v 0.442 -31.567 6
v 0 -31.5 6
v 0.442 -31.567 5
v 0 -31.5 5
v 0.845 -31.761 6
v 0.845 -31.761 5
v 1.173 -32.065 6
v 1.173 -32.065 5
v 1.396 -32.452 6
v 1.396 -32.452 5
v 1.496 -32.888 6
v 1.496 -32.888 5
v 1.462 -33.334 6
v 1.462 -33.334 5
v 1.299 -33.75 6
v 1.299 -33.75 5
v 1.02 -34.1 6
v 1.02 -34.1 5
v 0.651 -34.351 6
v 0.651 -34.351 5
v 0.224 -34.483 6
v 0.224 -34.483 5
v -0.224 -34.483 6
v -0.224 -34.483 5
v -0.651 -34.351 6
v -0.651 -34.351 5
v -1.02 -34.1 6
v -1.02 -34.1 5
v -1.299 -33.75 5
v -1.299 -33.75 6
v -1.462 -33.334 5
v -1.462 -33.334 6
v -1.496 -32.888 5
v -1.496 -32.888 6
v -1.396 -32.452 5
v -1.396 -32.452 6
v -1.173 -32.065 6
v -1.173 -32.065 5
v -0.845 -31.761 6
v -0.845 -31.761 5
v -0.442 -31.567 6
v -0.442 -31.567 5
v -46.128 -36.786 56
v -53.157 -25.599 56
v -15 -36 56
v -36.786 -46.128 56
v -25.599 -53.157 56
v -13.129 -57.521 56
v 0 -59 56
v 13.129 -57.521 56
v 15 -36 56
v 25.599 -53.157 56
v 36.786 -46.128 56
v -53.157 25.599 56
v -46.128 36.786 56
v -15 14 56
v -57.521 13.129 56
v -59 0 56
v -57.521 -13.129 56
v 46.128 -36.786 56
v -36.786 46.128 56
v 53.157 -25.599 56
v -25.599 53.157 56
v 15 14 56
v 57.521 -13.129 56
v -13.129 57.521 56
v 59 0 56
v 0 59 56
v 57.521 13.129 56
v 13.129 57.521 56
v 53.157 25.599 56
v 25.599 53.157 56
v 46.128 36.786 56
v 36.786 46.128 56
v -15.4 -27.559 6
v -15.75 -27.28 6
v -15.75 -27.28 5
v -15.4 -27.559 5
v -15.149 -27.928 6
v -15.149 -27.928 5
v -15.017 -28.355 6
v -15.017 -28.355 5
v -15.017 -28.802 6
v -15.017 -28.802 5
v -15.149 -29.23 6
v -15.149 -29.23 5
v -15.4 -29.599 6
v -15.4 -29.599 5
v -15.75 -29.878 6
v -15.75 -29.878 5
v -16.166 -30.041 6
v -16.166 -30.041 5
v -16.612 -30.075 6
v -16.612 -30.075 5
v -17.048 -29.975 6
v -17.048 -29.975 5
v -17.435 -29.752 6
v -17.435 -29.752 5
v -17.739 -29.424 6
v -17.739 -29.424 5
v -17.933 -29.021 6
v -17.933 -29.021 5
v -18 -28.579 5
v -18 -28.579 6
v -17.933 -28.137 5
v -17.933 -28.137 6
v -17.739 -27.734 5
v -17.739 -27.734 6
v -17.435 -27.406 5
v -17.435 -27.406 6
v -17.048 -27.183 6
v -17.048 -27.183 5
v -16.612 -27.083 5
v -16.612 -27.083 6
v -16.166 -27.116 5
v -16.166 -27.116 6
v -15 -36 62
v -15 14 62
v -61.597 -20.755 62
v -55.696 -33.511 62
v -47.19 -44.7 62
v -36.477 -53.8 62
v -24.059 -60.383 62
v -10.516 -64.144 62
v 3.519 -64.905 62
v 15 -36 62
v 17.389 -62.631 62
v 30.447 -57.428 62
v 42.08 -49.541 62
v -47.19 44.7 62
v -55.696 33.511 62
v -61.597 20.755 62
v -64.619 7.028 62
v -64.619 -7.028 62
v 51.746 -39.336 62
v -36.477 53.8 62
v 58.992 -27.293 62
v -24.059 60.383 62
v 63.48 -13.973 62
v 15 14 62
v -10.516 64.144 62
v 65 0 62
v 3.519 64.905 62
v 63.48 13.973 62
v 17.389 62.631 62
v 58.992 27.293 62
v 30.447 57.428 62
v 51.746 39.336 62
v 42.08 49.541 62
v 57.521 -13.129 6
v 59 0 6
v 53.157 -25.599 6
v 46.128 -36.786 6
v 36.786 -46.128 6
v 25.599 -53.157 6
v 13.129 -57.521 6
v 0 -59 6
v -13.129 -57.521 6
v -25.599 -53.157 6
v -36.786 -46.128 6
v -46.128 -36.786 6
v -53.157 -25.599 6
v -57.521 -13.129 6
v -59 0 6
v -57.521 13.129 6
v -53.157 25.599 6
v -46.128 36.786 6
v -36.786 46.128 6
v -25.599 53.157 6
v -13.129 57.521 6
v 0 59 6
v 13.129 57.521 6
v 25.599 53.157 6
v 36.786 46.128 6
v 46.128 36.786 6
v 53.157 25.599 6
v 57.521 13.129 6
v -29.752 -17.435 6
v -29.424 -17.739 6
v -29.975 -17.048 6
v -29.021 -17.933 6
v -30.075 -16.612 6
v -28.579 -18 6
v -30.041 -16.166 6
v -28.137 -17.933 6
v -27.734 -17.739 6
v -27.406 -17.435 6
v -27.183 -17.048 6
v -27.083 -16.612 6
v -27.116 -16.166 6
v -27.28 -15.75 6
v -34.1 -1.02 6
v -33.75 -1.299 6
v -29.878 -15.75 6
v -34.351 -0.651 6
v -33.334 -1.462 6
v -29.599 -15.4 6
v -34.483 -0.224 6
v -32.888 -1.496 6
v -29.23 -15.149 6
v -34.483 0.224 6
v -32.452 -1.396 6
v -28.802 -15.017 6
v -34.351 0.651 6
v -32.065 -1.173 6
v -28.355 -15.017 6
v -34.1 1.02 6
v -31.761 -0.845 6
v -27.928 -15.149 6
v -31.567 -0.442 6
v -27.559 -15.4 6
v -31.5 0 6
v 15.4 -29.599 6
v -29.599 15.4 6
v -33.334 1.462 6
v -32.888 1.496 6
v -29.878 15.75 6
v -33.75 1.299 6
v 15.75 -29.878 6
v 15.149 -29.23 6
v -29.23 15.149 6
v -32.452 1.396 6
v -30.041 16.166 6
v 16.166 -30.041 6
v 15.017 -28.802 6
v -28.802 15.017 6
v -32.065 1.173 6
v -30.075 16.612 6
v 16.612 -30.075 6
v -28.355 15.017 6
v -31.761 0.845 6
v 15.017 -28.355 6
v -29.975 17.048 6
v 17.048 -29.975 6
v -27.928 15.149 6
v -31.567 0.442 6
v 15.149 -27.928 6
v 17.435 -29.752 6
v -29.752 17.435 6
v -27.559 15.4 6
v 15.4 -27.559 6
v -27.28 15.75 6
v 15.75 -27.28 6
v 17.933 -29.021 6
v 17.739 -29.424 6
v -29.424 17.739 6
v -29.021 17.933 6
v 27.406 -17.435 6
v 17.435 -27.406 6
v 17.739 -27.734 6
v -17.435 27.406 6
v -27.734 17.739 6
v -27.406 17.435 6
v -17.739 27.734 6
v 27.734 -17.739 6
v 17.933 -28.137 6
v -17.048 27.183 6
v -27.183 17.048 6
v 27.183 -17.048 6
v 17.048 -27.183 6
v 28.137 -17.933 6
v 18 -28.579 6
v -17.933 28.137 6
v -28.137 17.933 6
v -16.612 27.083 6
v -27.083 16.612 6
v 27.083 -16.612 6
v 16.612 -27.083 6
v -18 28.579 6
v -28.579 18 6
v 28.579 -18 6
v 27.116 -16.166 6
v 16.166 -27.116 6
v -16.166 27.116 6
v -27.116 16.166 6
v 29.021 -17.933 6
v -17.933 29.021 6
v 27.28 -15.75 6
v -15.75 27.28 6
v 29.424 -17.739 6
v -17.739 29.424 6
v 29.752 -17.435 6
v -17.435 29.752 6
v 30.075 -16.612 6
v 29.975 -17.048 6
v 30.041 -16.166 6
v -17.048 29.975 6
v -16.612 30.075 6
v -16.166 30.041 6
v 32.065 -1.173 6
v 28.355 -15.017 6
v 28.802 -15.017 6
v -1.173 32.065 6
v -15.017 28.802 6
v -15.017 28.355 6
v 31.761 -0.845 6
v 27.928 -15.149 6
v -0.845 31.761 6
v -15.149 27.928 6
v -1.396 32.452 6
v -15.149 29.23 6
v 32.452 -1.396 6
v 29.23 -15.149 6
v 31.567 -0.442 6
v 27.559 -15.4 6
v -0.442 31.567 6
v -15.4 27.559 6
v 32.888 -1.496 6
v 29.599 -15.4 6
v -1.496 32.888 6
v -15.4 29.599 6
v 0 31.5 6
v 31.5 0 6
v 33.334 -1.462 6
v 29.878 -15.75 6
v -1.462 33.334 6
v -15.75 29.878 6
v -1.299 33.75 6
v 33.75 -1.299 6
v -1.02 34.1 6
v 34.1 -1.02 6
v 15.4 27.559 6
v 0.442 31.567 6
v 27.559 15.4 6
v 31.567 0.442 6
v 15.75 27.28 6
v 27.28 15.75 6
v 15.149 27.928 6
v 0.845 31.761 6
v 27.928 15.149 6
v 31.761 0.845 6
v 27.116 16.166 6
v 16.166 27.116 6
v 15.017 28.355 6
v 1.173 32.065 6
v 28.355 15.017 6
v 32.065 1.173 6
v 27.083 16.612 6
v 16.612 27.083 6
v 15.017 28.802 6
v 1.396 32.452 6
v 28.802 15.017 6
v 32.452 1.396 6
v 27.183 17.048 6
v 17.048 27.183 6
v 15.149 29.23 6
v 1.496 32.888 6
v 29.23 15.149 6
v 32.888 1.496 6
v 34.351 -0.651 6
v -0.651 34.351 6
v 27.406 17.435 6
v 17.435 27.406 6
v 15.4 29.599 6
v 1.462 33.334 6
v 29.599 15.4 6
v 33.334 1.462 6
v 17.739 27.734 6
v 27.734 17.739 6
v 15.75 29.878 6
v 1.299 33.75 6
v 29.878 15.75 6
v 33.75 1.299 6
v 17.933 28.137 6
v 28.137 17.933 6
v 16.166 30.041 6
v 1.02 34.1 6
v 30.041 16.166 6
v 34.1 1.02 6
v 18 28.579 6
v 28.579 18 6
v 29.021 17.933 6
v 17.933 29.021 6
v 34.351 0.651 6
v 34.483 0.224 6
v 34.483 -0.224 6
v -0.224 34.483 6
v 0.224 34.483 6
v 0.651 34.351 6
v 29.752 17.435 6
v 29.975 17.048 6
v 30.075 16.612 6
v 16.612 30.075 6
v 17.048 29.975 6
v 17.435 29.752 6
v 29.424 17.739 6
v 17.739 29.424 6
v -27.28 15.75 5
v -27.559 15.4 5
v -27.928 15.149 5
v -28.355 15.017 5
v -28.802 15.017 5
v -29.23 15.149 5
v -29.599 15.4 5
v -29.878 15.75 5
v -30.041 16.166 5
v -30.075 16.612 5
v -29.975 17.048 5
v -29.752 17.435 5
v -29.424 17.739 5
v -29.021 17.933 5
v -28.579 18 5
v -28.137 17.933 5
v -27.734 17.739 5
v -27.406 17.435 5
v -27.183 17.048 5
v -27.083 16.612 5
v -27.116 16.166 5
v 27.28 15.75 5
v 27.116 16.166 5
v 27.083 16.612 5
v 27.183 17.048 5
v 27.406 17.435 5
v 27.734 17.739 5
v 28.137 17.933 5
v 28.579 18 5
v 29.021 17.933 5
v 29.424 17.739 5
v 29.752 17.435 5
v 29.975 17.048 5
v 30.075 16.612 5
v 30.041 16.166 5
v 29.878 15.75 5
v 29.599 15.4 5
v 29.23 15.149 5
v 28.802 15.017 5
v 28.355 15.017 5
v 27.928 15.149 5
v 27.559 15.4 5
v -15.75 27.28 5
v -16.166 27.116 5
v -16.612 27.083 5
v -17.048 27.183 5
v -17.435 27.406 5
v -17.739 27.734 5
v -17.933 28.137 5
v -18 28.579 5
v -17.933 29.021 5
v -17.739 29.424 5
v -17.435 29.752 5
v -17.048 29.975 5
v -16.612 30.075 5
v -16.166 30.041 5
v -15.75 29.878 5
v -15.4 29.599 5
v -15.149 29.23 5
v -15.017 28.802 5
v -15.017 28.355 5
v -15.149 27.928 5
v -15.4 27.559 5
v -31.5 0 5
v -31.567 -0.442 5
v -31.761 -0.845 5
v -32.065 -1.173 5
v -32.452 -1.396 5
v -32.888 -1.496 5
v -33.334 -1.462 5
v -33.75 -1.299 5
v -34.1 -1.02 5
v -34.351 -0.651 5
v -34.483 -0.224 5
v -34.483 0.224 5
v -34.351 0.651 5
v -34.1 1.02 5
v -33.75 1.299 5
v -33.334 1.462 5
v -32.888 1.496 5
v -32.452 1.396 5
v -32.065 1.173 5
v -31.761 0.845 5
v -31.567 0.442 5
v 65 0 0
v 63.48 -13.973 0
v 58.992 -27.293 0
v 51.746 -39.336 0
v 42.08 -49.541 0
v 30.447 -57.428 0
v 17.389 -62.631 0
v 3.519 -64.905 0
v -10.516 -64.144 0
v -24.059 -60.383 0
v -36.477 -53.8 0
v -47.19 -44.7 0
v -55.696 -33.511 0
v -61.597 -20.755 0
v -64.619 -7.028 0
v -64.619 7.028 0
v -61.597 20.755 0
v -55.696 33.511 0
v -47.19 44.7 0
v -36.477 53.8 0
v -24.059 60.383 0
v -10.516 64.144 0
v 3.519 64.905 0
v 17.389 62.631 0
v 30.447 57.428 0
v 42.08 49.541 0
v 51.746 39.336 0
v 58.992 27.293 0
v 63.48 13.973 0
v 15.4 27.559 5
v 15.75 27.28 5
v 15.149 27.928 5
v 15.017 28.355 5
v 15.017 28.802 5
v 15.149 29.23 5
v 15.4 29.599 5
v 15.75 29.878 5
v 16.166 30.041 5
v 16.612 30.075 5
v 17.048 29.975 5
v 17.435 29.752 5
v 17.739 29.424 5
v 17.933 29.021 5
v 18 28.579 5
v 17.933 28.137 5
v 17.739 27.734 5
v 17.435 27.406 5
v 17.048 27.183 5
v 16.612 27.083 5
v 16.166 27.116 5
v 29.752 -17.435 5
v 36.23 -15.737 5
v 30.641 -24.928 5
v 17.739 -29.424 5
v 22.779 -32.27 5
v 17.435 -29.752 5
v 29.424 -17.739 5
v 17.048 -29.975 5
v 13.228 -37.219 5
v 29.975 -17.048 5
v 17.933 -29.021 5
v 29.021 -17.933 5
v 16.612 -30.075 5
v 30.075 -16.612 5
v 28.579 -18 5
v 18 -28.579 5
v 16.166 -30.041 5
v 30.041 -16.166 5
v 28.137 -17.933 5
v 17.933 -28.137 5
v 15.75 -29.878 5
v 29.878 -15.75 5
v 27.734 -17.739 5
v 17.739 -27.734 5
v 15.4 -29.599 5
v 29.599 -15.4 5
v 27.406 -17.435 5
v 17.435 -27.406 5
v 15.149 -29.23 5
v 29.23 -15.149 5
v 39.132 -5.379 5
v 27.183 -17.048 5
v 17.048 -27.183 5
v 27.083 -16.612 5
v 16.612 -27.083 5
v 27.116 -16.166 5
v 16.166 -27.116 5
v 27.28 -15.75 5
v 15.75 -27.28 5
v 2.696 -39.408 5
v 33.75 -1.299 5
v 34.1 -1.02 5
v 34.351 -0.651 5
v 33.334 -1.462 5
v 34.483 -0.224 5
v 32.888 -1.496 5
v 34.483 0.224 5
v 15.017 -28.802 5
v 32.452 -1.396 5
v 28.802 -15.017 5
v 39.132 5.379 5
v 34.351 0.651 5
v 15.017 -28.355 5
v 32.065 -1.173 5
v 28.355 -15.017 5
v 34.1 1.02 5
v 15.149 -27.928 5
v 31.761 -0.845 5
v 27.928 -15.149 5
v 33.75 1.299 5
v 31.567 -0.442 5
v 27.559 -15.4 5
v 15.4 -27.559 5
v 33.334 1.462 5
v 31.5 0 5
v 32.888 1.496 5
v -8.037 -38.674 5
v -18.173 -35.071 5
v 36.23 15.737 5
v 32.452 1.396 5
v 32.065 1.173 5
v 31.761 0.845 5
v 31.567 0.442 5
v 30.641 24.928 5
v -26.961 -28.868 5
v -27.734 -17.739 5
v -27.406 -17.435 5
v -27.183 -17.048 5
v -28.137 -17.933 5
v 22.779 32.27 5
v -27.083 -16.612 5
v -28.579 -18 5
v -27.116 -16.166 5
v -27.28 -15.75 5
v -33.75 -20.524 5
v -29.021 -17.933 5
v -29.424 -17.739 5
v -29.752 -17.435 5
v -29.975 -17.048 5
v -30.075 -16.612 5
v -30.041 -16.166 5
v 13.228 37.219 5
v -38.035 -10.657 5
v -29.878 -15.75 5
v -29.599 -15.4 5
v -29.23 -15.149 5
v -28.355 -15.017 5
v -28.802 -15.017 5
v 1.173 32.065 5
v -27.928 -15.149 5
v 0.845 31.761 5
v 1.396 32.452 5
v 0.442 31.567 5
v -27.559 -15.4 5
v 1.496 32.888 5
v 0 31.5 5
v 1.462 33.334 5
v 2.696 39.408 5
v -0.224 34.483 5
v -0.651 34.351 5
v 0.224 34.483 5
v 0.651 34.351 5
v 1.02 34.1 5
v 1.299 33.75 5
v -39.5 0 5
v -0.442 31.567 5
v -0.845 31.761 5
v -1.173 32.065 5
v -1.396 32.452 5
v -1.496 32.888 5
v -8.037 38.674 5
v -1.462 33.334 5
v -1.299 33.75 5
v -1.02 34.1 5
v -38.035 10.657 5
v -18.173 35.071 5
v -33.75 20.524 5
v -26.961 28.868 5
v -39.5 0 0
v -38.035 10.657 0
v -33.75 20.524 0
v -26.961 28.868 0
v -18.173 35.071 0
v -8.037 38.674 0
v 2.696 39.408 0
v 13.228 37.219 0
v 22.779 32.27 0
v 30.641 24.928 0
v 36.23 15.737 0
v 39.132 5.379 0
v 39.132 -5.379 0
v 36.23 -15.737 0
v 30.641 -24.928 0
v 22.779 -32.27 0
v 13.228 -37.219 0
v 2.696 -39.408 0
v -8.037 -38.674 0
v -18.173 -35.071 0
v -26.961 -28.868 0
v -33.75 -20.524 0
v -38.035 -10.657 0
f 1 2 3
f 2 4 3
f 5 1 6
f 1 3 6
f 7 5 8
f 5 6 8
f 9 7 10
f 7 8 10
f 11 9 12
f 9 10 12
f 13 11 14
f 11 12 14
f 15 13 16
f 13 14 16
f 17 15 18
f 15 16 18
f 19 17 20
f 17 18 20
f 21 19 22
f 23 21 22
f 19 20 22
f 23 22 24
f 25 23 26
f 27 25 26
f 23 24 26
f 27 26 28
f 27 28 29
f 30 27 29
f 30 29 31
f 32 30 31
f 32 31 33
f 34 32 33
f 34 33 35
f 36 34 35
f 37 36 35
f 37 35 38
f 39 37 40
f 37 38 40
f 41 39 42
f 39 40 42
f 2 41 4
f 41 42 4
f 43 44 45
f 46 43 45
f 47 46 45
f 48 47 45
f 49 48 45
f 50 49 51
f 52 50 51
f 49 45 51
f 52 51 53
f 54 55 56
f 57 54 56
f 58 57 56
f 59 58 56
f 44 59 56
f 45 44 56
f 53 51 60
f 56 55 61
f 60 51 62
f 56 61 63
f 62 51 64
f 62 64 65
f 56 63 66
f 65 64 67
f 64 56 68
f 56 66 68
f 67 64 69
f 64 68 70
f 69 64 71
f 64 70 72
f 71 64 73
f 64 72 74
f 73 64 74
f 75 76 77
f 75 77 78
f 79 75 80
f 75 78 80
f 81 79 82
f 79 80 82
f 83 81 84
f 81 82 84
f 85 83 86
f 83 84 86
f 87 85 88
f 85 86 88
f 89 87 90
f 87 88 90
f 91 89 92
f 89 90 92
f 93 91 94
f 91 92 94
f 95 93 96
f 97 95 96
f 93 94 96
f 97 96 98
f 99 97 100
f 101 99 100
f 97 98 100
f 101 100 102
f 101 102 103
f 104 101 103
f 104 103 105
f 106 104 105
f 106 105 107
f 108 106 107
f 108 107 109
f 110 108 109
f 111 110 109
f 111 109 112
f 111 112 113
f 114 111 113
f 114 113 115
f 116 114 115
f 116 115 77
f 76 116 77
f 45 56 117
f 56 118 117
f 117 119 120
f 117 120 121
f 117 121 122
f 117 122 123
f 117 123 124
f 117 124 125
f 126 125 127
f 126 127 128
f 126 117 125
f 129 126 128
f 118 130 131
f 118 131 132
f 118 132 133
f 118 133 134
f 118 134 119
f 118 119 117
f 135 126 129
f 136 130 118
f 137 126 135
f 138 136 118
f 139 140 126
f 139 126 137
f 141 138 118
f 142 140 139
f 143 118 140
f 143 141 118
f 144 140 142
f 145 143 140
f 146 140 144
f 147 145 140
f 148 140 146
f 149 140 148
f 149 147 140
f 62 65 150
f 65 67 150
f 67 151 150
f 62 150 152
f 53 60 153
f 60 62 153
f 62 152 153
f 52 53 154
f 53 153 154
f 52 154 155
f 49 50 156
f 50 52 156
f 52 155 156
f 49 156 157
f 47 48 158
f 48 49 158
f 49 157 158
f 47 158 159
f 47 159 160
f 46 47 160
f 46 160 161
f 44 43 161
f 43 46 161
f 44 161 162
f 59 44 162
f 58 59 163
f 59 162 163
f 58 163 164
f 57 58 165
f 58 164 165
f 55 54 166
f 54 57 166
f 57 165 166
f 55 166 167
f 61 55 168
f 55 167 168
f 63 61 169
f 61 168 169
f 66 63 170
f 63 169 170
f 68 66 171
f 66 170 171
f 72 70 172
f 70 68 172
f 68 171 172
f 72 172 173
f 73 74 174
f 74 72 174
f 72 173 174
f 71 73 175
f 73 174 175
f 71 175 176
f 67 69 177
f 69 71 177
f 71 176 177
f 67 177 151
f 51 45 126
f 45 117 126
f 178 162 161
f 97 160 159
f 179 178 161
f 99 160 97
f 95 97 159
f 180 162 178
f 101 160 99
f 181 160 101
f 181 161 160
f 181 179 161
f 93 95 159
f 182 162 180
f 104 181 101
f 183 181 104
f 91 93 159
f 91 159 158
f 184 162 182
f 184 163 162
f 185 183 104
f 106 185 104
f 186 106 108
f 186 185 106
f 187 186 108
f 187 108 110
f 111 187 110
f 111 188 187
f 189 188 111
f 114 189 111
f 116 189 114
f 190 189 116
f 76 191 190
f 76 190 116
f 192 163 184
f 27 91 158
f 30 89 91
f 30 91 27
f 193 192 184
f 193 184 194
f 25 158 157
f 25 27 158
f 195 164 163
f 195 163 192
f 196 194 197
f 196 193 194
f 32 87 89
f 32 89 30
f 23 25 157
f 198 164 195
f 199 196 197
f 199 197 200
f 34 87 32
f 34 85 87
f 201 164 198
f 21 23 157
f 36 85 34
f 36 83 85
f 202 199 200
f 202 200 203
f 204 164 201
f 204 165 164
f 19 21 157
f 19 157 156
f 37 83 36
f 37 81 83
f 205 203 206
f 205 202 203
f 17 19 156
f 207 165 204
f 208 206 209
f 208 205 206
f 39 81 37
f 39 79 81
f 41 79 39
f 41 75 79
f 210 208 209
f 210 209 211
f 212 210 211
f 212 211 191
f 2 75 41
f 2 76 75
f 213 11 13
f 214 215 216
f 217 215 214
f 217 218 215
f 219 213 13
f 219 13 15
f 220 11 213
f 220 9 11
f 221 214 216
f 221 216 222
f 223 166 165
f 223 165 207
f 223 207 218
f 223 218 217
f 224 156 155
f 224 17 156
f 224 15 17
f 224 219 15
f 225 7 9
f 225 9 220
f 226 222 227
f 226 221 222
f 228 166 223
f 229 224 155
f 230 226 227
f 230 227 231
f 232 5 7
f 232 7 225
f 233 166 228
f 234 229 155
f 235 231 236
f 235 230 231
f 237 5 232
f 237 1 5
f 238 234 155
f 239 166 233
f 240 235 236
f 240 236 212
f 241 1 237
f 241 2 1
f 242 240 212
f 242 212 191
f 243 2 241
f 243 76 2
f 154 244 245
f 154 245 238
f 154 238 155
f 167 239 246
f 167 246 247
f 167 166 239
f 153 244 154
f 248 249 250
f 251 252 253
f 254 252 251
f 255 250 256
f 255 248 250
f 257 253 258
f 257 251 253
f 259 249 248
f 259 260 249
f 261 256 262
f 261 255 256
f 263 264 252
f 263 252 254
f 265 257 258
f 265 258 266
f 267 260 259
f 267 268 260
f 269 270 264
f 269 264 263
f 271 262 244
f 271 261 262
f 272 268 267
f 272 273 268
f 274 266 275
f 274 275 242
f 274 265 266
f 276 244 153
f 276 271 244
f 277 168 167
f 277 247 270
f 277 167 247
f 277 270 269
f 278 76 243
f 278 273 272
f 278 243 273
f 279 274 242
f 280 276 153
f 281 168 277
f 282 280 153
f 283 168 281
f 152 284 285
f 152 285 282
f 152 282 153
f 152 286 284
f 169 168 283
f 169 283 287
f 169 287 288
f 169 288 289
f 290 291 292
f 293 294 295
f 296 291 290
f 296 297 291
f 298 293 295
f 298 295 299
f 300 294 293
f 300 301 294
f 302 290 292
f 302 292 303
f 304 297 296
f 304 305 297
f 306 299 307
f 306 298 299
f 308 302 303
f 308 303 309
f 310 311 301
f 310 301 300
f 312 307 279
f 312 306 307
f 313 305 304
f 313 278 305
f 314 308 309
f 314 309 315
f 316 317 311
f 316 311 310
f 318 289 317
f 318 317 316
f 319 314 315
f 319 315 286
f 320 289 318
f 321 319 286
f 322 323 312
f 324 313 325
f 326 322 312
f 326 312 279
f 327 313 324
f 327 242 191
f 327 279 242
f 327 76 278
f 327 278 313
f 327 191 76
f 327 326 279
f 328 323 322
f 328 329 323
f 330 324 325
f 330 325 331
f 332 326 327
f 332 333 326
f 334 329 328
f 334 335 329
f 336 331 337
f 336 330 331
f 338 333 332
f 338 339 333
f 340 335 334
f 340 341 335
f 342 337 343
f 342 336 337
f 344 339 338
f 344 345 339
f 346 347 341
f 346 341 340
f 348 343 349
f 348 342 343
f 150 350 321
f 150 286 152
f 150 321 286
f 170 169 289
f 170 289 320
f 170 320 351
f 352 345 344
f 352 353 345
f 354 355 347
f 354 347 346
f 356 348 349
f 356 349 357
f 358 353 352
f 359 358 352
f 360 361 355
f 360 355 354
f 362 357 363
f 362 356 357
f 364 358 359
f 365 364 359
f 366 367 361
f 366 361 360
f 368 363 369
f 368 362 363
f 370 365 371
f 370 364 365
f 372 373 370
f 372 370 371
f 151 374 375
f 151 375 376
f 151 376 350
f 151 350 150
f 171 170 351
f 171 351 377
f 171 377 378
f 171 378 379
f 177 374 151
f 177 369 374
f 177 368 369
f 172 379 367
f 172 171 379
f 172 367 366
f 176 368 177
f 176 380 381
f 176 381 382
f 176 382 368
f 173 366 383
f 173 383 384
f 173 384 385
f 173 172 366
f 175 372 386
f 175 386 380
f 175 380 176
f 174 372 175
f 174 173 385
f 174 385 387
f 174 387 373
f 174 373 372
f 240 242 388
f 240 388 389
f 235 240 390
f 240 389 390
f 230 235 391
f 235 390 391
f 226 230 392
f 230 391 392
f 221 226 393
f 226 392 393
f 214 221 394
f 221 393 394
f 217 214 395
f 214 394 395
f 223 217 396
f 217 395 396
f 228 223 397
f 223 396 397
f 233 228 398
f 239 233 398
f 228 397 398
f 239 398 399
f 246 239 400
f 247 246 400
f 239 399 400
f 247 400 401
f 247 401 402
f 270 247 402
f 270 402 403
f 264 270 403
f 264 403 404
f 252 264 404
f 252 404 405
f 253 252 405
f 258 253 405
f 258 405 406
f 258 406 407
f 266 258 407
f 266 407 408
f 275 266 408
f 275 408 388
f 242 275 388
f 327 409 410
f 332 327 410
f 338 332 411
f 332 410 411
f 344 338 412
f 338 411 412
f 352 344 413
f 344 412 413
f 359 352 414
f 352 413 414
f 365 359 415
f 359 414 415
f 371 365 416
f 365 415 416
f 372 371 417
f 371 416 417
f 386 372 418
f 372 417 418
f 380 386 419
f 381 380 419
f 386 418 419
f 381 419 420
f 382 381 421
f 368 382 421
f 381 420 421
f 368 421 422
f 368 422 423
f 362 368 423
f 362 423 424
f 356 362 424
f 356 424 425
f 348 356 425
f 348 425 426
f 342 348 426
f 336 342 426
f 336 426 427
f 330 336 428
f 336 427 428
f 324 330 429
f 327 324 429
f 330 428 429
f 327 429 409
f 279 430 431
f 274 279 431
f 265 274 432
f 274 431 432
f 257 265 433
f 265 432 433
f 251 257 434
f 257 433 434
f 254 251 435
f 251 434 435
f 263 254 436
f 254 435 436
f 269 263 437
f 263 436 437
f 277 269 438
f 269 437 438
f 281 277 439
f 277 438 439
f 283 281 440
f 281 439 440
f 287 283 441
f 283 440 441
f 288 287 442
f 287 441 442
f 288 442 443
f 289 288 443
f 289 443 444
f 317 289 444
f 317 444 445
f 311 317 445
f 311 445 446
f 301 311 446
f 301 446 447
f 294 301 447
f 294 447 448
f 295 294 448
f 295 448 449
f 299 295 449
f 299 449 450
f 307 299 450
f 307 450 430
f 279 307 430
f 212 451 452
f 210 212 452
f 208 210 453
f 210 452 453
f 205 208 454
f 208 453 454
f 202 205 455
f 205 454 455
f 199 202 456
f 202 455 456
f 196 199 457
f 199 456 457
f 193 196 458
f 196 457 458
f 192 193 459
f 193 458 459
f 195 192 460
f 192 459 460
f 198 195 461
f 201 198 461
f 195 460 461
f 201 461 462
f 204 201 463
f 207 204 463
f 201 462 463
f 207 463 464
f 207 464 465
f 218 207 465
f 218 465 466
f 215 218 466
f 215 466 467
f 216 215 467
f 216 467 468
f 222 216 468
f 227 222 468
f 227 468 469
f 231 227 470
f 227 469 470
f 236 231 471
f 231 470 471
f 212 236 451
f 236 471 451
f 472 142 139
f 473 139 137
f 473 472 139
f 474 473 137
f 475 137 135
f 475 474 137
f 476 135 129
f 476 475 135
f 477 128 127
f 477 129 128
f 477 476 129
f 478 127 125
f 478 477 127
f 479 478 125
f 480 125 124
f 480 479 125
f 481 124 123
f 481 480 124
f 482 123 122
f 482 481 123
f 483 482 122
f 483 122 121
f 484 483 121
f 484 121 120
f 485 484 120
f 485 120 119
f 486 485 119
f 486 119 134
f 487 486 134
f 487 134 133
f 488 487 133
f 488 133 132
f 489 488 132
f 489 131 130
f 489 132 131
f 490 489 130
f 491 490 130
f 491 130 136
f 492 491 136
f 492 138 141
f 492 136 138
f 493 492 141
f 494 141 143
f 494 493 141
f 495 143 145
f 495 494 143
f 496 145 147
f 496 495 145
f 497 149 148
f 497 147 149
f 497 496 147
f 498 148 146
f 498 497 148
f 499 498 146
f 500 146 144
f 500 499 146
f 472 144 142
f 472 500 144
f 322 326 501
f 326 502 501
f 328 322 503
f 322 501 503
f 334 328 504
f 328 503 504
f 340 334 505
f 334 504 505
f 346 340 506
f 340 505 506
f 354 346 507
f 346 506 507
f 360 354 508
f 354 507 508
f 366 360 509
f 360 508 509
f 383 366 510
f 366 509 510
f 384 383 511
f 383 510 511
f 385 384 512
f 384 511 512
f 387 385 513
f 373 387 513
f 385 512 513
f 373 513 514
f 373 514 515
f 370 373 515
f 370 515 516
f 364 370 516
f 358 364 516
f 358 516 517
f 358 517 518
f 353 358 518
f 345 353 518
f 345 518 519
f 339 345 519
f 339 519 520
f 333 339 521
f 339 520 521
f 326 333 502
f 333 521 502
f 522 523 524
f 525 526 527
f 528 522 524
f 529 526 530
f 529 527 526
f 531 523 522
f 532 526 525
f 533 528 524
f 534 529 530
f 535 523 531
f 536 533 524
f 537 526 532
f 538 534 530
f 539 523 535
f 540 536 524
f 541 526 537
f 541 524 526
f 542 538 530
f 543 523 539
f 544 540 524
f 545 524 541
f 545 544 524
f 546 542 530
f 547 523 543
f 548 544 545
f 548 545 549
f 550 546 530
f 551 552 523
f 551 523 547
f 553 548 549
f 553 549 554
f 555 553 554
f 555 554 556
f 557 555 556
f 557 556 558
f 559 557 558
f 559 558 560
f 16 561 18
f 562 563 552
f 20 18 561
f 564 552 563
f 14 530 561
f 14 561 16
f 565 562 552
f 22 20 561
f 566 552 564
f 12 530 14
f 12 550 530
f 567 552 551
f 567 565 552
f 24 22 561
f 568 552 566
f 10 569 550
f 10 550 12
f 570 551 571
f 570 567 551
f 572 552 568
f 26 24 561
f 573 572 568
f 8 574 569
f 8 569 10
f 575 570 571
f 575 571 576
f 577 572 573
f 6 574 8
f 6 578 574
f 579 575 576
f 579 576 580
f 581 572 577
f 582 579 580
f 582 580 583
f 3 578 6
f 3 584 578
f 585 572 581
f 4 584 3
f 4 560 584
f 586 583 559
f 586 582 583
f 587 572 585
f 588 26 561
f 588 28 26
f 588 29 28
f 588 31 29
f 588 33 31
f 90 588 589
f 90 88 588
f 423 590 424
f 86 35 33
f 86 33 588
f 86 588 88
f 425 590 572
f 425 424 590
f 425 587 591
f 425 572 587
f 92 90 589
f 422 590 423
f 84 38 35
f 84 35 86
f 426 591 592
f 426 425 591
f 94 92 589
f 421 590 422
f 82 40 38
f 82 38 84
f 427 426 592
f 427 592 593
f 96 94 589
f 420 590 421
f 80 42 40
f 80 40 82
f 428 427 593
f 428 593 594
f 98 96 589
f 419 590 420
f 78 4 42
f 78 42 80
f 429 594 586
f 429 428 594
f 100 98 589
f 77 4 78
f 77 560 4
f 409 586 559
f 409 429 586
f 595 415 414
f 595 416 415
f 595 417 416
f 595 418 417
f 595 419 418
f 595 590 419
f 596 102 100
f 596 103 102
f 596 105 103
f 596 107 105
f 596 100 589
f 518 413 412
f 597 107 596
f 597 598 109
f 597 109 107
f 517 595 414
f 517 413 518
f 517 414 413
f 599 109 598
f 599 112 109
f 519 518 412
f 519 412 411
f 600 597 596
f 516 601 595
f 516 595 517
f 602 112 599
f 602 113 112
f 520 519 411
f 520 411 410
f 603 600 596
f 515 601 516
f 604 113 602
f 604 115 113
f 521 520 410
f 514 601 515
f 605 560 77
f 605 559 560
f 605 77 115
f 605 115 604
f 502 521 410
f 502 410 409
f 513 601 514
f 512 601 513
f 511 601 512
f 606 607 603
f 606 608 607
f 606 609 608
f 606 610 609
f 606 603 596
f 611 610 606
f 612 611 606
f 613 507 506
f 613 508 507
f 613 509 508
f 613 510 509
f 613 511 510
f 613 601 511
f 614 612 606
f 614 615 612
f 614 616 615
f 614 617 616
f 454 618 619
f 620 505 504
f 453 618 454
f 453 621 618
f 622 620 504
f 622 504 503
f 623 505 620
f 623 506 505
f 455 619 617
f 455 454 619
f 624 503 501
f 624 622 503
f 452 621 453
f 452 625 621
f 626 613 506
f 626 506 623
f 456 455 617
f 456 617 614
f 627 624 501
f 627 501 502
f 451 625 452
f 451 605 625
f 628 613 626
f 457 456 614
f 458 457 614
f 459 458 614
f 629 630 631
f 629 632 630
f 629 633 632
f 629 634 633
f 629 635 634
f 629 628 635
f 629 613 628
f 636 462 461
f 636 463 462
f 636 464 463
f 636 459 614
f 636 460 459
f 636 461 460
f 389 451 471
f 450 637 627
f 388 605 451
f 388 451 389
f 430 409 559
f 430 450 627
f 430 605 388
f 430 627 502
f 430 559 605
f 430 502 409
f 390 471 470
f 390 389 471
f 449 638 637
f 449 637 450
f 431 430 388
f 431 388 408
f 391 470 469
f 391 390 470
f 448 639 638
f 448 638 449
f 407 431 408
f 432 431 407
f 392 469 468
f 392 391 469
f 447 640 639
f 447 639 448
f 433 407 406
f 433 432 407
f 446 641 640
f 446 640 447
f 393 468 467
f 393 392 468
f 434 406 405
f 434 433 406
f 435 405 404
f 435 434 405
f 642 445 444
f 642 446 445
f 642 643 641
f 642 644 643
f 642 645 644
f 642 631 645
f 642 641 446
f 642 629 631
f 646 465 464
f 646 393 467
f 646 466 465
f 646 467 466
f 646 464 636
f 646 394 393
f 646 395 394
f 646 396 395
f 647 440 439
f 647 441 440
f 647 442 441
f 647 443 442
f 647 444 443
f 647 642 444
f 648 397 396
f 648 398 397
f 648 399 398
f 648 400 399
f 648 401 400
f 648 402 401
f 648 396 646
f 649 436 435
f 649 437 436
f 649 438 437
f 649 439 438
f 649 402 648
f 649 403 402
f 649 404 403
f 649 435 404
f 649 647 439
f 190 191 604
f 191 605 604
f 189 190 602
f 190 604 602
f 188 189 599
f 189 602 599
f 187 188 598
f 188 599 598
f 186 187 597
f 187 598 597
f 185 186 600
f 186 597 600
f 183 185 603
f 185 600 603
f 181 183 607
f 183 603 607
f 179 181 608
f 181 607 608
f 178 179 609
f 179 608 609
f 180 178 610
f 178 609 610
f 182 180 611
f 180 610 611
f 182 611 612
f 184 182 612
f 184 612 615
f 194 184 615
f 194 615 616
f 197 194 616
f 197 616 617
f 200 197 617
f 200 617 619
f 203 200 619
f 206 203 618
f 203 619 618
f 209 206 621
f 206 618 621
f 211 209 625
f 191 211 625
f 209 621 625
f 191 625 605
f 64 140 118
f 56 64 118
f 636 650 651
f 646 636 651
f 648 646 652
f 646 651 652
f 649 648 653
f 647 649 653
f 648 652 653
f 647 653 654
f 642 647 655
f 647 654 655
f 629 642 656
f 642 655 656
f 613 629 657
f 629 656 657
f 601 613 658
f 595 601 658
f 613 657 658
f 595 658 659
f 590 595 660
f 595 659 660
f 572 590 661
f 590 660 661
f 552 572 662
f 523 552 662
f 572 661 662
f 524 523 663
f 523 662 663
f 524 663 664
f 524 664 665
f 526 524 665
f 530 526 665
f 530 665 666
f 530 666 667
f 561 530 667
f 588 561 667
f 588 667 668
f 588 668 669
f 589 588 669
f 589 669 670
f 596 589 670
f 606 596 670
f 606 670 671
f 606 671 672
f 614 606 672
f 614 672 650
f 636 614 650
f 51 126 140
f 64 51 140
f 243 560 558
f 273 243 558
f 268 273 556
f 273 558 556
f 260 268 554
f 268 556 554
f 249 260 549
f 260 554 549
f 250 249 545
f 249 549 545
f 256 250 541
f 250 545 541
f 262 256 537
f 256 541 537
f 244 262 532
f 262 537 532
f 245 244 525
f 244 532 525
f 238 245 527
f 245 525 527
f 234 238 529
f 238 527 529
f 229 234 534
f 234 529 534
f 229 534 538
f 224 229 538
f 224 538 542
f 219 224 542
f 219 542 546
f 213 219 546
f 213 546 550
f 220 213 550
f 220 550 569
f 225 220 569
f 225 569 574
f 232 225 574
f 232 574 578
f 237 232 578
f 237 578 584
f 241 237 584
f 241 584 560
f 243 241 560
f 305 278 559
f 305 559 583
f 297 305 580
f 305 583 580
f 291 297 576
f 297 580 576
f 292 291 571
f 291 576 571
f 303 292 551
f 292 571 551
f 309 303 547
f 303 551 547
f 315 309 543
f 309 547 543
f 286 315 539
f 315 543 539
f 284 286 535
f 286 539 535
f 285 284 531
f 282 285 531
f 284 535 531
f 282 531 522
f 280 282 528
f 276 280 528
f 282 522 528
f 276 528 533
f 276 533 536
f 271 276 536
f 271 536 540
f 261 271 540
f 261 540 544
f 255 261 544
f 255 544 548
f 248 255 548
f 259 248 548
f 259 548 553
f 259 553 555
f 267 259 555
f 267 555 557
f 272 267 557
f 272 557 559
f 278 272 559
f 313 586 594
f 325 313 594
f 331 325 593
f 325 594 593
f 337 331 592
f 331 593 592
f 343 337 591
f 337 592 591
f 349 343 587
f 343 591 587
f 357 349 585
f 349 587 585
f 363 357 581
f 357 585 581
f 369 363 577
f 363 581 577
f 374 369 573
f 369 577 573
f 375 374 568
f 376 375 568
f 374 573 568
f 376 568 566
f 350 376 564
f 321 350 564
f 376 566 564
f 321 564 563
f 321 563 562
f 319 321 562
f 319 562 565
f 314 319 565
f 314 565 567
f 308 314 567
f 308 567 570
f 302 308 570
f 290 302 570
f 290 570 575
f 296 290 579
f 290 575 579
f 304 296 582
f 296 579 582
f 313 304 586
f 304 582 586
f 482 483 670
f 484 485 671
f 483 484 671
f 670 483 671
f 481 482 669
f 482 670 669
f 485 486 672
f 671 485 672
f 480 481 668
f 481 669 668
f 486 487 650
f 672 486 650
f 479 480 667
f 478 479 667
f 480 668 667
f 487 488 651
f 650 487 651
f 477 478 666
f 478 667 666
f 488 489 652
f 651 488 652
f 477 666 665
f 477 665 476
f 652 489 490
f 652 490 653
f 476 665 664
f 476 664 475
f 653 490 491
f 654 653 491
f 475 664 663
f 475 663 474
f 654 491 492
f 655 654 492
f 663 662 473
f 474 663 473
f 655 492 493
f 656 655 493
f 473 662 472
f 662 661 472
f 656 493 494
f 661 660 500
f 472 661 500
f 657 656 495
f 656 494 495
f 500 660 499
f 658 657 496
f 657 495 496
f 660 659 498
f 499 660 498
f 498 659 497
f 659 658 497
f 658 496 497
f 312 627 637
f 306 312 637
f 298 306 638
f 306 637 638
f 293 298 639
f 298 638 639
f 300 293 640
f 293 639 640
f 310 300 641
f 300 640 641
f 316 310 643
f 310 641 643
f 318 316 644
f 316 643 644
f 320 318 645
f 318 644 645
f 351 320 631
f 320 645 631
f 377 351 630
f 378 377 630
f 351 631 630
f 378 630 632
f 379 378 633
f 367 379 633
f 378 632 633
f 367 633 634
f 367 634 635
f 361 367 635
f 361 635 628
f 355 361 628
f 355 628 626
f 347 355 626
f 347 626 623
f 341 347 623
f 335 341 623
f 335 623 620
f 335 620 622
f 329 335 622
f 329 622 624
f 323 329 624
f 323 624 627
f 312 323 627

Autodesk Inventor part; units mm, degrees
ref_plane "YZ Plane" through (0, 0, 0) normal (1, 0, 0) x (0, 1, 0)
ref_plane "XZ Plane" through (0, 0, 0) normal (0, 1, 0) x (-1, 0, 0)
ref_plane "XY Plane" through (0, 0, 0) normal (0, 0, 1) x (1, 0, 0)
sketch "Sketch1" plane through (0, 0, 0) normal (0, 0, 1) x (1, 0, 0)
  circle A0 centre (0, 0) radius 65
  dimension "d0" = 130
extrude "Extrusion1" add sketch "Sketch1" along normal blind 6
sketch "Sketch2" plane through (0, 0, 6) normal (0, 0, 1) x (1, 0, 0)
  circle A0 centre (0, 0) radius 65
  circle A1 centre (0, 0) radius 65 projected
  circle A2 centre (0, 0) radius 59
  dimension "d3" = 6
extrude "Extrusion2" add sketch "Sketch2" along normal blind 50
sketch "Sketch3" plane through (0, 0, 56) normal (0, 0, 1) x (1, 0, 0)
  circle A0 centre (0, 0) radius 65
extrude "Extrusion3" add sketch "Sketch3" along normal blind 6
sketch "Sketch4" plane through (0, 0, 62) normal (0, 0, 1) x (1, 0, 0)
  line L0 (0, 0) -> (0, -36) construction
  line L1 (15, 14) -> (-15, 14)
  line L2 (-15, 14) -> (-15, -36)
  line L3 (-15, -36) -> (15, -36)
  line L4 (15, -36) -> (15, 14)
  point P0 (-15, 0)
  point P1 (0, 14)
  dimension "d25" = 36
  dimension "d26" = 50
  dimension "d27" = 30
extrude "Extrusion4" cut sketch "Sketch4" against normal blind 6
sketch "Sketch5" plane through (0, 0, 62) normal (0, 0, 1) x (1, 0, 0)
  line L0 (15, 25) -> (25, 25)
  line L1 (25, 25) -> (25, -5)
  line L2 (25, -5) -> (15, -5)
  line L3 (15, -5) -> (15, 25)
  point P0 (0, 0)
  dimension "d13" = 30
  dimension "d14" = 10
extrude "Extrusion5" [suppressed]
sketch "Sketch6" plane through (15, -25, 56) normal (-1, 0, 0) x (0, 0, 1)
  circle A0 centre (33, 23.5) radius 1
  circle A1 centre (33, 6.5) radius 1
  line L0 (36, 30) -> (36, 0) projected
  line L1 (33, 23.5) -> (33, 6.5) construction
  point P0 (-56, 25)
  point P1 (36, 15)
  point P2 (33, 15)
  dimension "d17" = 17
  dimension "d19" = 2
  dimension "d20" = 2
  dimension "d21" = 3
extrude "Extrusion6" [suppressed]
sketch "Sketch7" plane through (0, 0, 0) normal (0, 0, -1) x (-1, 0, 0)
  circle A0 centre (0, 0) radius 39.5
  dimension "d28" = 79
extrude "Extrusion7" cut sketch "Sketch7" against normal blind 5
sketch "Sketch8" plane through (0, 0, 5) normal (0, 0, -1) x (-1, 0, 0)
  circle A0 centre (-33, 0) radius 1.5
  point P0 (0, 0)
  dimension "d31" = 3
  dimension "d32" = 33
extrude "Extrusion8" cut sketch "Sketch8" against normal blind 5
pattern_circular "Circular Pattern1" count 12 over 360 about axis through (0, 0, 0) along (0, 0, 1) of "Extrusion8"
properties part number "per_base"
